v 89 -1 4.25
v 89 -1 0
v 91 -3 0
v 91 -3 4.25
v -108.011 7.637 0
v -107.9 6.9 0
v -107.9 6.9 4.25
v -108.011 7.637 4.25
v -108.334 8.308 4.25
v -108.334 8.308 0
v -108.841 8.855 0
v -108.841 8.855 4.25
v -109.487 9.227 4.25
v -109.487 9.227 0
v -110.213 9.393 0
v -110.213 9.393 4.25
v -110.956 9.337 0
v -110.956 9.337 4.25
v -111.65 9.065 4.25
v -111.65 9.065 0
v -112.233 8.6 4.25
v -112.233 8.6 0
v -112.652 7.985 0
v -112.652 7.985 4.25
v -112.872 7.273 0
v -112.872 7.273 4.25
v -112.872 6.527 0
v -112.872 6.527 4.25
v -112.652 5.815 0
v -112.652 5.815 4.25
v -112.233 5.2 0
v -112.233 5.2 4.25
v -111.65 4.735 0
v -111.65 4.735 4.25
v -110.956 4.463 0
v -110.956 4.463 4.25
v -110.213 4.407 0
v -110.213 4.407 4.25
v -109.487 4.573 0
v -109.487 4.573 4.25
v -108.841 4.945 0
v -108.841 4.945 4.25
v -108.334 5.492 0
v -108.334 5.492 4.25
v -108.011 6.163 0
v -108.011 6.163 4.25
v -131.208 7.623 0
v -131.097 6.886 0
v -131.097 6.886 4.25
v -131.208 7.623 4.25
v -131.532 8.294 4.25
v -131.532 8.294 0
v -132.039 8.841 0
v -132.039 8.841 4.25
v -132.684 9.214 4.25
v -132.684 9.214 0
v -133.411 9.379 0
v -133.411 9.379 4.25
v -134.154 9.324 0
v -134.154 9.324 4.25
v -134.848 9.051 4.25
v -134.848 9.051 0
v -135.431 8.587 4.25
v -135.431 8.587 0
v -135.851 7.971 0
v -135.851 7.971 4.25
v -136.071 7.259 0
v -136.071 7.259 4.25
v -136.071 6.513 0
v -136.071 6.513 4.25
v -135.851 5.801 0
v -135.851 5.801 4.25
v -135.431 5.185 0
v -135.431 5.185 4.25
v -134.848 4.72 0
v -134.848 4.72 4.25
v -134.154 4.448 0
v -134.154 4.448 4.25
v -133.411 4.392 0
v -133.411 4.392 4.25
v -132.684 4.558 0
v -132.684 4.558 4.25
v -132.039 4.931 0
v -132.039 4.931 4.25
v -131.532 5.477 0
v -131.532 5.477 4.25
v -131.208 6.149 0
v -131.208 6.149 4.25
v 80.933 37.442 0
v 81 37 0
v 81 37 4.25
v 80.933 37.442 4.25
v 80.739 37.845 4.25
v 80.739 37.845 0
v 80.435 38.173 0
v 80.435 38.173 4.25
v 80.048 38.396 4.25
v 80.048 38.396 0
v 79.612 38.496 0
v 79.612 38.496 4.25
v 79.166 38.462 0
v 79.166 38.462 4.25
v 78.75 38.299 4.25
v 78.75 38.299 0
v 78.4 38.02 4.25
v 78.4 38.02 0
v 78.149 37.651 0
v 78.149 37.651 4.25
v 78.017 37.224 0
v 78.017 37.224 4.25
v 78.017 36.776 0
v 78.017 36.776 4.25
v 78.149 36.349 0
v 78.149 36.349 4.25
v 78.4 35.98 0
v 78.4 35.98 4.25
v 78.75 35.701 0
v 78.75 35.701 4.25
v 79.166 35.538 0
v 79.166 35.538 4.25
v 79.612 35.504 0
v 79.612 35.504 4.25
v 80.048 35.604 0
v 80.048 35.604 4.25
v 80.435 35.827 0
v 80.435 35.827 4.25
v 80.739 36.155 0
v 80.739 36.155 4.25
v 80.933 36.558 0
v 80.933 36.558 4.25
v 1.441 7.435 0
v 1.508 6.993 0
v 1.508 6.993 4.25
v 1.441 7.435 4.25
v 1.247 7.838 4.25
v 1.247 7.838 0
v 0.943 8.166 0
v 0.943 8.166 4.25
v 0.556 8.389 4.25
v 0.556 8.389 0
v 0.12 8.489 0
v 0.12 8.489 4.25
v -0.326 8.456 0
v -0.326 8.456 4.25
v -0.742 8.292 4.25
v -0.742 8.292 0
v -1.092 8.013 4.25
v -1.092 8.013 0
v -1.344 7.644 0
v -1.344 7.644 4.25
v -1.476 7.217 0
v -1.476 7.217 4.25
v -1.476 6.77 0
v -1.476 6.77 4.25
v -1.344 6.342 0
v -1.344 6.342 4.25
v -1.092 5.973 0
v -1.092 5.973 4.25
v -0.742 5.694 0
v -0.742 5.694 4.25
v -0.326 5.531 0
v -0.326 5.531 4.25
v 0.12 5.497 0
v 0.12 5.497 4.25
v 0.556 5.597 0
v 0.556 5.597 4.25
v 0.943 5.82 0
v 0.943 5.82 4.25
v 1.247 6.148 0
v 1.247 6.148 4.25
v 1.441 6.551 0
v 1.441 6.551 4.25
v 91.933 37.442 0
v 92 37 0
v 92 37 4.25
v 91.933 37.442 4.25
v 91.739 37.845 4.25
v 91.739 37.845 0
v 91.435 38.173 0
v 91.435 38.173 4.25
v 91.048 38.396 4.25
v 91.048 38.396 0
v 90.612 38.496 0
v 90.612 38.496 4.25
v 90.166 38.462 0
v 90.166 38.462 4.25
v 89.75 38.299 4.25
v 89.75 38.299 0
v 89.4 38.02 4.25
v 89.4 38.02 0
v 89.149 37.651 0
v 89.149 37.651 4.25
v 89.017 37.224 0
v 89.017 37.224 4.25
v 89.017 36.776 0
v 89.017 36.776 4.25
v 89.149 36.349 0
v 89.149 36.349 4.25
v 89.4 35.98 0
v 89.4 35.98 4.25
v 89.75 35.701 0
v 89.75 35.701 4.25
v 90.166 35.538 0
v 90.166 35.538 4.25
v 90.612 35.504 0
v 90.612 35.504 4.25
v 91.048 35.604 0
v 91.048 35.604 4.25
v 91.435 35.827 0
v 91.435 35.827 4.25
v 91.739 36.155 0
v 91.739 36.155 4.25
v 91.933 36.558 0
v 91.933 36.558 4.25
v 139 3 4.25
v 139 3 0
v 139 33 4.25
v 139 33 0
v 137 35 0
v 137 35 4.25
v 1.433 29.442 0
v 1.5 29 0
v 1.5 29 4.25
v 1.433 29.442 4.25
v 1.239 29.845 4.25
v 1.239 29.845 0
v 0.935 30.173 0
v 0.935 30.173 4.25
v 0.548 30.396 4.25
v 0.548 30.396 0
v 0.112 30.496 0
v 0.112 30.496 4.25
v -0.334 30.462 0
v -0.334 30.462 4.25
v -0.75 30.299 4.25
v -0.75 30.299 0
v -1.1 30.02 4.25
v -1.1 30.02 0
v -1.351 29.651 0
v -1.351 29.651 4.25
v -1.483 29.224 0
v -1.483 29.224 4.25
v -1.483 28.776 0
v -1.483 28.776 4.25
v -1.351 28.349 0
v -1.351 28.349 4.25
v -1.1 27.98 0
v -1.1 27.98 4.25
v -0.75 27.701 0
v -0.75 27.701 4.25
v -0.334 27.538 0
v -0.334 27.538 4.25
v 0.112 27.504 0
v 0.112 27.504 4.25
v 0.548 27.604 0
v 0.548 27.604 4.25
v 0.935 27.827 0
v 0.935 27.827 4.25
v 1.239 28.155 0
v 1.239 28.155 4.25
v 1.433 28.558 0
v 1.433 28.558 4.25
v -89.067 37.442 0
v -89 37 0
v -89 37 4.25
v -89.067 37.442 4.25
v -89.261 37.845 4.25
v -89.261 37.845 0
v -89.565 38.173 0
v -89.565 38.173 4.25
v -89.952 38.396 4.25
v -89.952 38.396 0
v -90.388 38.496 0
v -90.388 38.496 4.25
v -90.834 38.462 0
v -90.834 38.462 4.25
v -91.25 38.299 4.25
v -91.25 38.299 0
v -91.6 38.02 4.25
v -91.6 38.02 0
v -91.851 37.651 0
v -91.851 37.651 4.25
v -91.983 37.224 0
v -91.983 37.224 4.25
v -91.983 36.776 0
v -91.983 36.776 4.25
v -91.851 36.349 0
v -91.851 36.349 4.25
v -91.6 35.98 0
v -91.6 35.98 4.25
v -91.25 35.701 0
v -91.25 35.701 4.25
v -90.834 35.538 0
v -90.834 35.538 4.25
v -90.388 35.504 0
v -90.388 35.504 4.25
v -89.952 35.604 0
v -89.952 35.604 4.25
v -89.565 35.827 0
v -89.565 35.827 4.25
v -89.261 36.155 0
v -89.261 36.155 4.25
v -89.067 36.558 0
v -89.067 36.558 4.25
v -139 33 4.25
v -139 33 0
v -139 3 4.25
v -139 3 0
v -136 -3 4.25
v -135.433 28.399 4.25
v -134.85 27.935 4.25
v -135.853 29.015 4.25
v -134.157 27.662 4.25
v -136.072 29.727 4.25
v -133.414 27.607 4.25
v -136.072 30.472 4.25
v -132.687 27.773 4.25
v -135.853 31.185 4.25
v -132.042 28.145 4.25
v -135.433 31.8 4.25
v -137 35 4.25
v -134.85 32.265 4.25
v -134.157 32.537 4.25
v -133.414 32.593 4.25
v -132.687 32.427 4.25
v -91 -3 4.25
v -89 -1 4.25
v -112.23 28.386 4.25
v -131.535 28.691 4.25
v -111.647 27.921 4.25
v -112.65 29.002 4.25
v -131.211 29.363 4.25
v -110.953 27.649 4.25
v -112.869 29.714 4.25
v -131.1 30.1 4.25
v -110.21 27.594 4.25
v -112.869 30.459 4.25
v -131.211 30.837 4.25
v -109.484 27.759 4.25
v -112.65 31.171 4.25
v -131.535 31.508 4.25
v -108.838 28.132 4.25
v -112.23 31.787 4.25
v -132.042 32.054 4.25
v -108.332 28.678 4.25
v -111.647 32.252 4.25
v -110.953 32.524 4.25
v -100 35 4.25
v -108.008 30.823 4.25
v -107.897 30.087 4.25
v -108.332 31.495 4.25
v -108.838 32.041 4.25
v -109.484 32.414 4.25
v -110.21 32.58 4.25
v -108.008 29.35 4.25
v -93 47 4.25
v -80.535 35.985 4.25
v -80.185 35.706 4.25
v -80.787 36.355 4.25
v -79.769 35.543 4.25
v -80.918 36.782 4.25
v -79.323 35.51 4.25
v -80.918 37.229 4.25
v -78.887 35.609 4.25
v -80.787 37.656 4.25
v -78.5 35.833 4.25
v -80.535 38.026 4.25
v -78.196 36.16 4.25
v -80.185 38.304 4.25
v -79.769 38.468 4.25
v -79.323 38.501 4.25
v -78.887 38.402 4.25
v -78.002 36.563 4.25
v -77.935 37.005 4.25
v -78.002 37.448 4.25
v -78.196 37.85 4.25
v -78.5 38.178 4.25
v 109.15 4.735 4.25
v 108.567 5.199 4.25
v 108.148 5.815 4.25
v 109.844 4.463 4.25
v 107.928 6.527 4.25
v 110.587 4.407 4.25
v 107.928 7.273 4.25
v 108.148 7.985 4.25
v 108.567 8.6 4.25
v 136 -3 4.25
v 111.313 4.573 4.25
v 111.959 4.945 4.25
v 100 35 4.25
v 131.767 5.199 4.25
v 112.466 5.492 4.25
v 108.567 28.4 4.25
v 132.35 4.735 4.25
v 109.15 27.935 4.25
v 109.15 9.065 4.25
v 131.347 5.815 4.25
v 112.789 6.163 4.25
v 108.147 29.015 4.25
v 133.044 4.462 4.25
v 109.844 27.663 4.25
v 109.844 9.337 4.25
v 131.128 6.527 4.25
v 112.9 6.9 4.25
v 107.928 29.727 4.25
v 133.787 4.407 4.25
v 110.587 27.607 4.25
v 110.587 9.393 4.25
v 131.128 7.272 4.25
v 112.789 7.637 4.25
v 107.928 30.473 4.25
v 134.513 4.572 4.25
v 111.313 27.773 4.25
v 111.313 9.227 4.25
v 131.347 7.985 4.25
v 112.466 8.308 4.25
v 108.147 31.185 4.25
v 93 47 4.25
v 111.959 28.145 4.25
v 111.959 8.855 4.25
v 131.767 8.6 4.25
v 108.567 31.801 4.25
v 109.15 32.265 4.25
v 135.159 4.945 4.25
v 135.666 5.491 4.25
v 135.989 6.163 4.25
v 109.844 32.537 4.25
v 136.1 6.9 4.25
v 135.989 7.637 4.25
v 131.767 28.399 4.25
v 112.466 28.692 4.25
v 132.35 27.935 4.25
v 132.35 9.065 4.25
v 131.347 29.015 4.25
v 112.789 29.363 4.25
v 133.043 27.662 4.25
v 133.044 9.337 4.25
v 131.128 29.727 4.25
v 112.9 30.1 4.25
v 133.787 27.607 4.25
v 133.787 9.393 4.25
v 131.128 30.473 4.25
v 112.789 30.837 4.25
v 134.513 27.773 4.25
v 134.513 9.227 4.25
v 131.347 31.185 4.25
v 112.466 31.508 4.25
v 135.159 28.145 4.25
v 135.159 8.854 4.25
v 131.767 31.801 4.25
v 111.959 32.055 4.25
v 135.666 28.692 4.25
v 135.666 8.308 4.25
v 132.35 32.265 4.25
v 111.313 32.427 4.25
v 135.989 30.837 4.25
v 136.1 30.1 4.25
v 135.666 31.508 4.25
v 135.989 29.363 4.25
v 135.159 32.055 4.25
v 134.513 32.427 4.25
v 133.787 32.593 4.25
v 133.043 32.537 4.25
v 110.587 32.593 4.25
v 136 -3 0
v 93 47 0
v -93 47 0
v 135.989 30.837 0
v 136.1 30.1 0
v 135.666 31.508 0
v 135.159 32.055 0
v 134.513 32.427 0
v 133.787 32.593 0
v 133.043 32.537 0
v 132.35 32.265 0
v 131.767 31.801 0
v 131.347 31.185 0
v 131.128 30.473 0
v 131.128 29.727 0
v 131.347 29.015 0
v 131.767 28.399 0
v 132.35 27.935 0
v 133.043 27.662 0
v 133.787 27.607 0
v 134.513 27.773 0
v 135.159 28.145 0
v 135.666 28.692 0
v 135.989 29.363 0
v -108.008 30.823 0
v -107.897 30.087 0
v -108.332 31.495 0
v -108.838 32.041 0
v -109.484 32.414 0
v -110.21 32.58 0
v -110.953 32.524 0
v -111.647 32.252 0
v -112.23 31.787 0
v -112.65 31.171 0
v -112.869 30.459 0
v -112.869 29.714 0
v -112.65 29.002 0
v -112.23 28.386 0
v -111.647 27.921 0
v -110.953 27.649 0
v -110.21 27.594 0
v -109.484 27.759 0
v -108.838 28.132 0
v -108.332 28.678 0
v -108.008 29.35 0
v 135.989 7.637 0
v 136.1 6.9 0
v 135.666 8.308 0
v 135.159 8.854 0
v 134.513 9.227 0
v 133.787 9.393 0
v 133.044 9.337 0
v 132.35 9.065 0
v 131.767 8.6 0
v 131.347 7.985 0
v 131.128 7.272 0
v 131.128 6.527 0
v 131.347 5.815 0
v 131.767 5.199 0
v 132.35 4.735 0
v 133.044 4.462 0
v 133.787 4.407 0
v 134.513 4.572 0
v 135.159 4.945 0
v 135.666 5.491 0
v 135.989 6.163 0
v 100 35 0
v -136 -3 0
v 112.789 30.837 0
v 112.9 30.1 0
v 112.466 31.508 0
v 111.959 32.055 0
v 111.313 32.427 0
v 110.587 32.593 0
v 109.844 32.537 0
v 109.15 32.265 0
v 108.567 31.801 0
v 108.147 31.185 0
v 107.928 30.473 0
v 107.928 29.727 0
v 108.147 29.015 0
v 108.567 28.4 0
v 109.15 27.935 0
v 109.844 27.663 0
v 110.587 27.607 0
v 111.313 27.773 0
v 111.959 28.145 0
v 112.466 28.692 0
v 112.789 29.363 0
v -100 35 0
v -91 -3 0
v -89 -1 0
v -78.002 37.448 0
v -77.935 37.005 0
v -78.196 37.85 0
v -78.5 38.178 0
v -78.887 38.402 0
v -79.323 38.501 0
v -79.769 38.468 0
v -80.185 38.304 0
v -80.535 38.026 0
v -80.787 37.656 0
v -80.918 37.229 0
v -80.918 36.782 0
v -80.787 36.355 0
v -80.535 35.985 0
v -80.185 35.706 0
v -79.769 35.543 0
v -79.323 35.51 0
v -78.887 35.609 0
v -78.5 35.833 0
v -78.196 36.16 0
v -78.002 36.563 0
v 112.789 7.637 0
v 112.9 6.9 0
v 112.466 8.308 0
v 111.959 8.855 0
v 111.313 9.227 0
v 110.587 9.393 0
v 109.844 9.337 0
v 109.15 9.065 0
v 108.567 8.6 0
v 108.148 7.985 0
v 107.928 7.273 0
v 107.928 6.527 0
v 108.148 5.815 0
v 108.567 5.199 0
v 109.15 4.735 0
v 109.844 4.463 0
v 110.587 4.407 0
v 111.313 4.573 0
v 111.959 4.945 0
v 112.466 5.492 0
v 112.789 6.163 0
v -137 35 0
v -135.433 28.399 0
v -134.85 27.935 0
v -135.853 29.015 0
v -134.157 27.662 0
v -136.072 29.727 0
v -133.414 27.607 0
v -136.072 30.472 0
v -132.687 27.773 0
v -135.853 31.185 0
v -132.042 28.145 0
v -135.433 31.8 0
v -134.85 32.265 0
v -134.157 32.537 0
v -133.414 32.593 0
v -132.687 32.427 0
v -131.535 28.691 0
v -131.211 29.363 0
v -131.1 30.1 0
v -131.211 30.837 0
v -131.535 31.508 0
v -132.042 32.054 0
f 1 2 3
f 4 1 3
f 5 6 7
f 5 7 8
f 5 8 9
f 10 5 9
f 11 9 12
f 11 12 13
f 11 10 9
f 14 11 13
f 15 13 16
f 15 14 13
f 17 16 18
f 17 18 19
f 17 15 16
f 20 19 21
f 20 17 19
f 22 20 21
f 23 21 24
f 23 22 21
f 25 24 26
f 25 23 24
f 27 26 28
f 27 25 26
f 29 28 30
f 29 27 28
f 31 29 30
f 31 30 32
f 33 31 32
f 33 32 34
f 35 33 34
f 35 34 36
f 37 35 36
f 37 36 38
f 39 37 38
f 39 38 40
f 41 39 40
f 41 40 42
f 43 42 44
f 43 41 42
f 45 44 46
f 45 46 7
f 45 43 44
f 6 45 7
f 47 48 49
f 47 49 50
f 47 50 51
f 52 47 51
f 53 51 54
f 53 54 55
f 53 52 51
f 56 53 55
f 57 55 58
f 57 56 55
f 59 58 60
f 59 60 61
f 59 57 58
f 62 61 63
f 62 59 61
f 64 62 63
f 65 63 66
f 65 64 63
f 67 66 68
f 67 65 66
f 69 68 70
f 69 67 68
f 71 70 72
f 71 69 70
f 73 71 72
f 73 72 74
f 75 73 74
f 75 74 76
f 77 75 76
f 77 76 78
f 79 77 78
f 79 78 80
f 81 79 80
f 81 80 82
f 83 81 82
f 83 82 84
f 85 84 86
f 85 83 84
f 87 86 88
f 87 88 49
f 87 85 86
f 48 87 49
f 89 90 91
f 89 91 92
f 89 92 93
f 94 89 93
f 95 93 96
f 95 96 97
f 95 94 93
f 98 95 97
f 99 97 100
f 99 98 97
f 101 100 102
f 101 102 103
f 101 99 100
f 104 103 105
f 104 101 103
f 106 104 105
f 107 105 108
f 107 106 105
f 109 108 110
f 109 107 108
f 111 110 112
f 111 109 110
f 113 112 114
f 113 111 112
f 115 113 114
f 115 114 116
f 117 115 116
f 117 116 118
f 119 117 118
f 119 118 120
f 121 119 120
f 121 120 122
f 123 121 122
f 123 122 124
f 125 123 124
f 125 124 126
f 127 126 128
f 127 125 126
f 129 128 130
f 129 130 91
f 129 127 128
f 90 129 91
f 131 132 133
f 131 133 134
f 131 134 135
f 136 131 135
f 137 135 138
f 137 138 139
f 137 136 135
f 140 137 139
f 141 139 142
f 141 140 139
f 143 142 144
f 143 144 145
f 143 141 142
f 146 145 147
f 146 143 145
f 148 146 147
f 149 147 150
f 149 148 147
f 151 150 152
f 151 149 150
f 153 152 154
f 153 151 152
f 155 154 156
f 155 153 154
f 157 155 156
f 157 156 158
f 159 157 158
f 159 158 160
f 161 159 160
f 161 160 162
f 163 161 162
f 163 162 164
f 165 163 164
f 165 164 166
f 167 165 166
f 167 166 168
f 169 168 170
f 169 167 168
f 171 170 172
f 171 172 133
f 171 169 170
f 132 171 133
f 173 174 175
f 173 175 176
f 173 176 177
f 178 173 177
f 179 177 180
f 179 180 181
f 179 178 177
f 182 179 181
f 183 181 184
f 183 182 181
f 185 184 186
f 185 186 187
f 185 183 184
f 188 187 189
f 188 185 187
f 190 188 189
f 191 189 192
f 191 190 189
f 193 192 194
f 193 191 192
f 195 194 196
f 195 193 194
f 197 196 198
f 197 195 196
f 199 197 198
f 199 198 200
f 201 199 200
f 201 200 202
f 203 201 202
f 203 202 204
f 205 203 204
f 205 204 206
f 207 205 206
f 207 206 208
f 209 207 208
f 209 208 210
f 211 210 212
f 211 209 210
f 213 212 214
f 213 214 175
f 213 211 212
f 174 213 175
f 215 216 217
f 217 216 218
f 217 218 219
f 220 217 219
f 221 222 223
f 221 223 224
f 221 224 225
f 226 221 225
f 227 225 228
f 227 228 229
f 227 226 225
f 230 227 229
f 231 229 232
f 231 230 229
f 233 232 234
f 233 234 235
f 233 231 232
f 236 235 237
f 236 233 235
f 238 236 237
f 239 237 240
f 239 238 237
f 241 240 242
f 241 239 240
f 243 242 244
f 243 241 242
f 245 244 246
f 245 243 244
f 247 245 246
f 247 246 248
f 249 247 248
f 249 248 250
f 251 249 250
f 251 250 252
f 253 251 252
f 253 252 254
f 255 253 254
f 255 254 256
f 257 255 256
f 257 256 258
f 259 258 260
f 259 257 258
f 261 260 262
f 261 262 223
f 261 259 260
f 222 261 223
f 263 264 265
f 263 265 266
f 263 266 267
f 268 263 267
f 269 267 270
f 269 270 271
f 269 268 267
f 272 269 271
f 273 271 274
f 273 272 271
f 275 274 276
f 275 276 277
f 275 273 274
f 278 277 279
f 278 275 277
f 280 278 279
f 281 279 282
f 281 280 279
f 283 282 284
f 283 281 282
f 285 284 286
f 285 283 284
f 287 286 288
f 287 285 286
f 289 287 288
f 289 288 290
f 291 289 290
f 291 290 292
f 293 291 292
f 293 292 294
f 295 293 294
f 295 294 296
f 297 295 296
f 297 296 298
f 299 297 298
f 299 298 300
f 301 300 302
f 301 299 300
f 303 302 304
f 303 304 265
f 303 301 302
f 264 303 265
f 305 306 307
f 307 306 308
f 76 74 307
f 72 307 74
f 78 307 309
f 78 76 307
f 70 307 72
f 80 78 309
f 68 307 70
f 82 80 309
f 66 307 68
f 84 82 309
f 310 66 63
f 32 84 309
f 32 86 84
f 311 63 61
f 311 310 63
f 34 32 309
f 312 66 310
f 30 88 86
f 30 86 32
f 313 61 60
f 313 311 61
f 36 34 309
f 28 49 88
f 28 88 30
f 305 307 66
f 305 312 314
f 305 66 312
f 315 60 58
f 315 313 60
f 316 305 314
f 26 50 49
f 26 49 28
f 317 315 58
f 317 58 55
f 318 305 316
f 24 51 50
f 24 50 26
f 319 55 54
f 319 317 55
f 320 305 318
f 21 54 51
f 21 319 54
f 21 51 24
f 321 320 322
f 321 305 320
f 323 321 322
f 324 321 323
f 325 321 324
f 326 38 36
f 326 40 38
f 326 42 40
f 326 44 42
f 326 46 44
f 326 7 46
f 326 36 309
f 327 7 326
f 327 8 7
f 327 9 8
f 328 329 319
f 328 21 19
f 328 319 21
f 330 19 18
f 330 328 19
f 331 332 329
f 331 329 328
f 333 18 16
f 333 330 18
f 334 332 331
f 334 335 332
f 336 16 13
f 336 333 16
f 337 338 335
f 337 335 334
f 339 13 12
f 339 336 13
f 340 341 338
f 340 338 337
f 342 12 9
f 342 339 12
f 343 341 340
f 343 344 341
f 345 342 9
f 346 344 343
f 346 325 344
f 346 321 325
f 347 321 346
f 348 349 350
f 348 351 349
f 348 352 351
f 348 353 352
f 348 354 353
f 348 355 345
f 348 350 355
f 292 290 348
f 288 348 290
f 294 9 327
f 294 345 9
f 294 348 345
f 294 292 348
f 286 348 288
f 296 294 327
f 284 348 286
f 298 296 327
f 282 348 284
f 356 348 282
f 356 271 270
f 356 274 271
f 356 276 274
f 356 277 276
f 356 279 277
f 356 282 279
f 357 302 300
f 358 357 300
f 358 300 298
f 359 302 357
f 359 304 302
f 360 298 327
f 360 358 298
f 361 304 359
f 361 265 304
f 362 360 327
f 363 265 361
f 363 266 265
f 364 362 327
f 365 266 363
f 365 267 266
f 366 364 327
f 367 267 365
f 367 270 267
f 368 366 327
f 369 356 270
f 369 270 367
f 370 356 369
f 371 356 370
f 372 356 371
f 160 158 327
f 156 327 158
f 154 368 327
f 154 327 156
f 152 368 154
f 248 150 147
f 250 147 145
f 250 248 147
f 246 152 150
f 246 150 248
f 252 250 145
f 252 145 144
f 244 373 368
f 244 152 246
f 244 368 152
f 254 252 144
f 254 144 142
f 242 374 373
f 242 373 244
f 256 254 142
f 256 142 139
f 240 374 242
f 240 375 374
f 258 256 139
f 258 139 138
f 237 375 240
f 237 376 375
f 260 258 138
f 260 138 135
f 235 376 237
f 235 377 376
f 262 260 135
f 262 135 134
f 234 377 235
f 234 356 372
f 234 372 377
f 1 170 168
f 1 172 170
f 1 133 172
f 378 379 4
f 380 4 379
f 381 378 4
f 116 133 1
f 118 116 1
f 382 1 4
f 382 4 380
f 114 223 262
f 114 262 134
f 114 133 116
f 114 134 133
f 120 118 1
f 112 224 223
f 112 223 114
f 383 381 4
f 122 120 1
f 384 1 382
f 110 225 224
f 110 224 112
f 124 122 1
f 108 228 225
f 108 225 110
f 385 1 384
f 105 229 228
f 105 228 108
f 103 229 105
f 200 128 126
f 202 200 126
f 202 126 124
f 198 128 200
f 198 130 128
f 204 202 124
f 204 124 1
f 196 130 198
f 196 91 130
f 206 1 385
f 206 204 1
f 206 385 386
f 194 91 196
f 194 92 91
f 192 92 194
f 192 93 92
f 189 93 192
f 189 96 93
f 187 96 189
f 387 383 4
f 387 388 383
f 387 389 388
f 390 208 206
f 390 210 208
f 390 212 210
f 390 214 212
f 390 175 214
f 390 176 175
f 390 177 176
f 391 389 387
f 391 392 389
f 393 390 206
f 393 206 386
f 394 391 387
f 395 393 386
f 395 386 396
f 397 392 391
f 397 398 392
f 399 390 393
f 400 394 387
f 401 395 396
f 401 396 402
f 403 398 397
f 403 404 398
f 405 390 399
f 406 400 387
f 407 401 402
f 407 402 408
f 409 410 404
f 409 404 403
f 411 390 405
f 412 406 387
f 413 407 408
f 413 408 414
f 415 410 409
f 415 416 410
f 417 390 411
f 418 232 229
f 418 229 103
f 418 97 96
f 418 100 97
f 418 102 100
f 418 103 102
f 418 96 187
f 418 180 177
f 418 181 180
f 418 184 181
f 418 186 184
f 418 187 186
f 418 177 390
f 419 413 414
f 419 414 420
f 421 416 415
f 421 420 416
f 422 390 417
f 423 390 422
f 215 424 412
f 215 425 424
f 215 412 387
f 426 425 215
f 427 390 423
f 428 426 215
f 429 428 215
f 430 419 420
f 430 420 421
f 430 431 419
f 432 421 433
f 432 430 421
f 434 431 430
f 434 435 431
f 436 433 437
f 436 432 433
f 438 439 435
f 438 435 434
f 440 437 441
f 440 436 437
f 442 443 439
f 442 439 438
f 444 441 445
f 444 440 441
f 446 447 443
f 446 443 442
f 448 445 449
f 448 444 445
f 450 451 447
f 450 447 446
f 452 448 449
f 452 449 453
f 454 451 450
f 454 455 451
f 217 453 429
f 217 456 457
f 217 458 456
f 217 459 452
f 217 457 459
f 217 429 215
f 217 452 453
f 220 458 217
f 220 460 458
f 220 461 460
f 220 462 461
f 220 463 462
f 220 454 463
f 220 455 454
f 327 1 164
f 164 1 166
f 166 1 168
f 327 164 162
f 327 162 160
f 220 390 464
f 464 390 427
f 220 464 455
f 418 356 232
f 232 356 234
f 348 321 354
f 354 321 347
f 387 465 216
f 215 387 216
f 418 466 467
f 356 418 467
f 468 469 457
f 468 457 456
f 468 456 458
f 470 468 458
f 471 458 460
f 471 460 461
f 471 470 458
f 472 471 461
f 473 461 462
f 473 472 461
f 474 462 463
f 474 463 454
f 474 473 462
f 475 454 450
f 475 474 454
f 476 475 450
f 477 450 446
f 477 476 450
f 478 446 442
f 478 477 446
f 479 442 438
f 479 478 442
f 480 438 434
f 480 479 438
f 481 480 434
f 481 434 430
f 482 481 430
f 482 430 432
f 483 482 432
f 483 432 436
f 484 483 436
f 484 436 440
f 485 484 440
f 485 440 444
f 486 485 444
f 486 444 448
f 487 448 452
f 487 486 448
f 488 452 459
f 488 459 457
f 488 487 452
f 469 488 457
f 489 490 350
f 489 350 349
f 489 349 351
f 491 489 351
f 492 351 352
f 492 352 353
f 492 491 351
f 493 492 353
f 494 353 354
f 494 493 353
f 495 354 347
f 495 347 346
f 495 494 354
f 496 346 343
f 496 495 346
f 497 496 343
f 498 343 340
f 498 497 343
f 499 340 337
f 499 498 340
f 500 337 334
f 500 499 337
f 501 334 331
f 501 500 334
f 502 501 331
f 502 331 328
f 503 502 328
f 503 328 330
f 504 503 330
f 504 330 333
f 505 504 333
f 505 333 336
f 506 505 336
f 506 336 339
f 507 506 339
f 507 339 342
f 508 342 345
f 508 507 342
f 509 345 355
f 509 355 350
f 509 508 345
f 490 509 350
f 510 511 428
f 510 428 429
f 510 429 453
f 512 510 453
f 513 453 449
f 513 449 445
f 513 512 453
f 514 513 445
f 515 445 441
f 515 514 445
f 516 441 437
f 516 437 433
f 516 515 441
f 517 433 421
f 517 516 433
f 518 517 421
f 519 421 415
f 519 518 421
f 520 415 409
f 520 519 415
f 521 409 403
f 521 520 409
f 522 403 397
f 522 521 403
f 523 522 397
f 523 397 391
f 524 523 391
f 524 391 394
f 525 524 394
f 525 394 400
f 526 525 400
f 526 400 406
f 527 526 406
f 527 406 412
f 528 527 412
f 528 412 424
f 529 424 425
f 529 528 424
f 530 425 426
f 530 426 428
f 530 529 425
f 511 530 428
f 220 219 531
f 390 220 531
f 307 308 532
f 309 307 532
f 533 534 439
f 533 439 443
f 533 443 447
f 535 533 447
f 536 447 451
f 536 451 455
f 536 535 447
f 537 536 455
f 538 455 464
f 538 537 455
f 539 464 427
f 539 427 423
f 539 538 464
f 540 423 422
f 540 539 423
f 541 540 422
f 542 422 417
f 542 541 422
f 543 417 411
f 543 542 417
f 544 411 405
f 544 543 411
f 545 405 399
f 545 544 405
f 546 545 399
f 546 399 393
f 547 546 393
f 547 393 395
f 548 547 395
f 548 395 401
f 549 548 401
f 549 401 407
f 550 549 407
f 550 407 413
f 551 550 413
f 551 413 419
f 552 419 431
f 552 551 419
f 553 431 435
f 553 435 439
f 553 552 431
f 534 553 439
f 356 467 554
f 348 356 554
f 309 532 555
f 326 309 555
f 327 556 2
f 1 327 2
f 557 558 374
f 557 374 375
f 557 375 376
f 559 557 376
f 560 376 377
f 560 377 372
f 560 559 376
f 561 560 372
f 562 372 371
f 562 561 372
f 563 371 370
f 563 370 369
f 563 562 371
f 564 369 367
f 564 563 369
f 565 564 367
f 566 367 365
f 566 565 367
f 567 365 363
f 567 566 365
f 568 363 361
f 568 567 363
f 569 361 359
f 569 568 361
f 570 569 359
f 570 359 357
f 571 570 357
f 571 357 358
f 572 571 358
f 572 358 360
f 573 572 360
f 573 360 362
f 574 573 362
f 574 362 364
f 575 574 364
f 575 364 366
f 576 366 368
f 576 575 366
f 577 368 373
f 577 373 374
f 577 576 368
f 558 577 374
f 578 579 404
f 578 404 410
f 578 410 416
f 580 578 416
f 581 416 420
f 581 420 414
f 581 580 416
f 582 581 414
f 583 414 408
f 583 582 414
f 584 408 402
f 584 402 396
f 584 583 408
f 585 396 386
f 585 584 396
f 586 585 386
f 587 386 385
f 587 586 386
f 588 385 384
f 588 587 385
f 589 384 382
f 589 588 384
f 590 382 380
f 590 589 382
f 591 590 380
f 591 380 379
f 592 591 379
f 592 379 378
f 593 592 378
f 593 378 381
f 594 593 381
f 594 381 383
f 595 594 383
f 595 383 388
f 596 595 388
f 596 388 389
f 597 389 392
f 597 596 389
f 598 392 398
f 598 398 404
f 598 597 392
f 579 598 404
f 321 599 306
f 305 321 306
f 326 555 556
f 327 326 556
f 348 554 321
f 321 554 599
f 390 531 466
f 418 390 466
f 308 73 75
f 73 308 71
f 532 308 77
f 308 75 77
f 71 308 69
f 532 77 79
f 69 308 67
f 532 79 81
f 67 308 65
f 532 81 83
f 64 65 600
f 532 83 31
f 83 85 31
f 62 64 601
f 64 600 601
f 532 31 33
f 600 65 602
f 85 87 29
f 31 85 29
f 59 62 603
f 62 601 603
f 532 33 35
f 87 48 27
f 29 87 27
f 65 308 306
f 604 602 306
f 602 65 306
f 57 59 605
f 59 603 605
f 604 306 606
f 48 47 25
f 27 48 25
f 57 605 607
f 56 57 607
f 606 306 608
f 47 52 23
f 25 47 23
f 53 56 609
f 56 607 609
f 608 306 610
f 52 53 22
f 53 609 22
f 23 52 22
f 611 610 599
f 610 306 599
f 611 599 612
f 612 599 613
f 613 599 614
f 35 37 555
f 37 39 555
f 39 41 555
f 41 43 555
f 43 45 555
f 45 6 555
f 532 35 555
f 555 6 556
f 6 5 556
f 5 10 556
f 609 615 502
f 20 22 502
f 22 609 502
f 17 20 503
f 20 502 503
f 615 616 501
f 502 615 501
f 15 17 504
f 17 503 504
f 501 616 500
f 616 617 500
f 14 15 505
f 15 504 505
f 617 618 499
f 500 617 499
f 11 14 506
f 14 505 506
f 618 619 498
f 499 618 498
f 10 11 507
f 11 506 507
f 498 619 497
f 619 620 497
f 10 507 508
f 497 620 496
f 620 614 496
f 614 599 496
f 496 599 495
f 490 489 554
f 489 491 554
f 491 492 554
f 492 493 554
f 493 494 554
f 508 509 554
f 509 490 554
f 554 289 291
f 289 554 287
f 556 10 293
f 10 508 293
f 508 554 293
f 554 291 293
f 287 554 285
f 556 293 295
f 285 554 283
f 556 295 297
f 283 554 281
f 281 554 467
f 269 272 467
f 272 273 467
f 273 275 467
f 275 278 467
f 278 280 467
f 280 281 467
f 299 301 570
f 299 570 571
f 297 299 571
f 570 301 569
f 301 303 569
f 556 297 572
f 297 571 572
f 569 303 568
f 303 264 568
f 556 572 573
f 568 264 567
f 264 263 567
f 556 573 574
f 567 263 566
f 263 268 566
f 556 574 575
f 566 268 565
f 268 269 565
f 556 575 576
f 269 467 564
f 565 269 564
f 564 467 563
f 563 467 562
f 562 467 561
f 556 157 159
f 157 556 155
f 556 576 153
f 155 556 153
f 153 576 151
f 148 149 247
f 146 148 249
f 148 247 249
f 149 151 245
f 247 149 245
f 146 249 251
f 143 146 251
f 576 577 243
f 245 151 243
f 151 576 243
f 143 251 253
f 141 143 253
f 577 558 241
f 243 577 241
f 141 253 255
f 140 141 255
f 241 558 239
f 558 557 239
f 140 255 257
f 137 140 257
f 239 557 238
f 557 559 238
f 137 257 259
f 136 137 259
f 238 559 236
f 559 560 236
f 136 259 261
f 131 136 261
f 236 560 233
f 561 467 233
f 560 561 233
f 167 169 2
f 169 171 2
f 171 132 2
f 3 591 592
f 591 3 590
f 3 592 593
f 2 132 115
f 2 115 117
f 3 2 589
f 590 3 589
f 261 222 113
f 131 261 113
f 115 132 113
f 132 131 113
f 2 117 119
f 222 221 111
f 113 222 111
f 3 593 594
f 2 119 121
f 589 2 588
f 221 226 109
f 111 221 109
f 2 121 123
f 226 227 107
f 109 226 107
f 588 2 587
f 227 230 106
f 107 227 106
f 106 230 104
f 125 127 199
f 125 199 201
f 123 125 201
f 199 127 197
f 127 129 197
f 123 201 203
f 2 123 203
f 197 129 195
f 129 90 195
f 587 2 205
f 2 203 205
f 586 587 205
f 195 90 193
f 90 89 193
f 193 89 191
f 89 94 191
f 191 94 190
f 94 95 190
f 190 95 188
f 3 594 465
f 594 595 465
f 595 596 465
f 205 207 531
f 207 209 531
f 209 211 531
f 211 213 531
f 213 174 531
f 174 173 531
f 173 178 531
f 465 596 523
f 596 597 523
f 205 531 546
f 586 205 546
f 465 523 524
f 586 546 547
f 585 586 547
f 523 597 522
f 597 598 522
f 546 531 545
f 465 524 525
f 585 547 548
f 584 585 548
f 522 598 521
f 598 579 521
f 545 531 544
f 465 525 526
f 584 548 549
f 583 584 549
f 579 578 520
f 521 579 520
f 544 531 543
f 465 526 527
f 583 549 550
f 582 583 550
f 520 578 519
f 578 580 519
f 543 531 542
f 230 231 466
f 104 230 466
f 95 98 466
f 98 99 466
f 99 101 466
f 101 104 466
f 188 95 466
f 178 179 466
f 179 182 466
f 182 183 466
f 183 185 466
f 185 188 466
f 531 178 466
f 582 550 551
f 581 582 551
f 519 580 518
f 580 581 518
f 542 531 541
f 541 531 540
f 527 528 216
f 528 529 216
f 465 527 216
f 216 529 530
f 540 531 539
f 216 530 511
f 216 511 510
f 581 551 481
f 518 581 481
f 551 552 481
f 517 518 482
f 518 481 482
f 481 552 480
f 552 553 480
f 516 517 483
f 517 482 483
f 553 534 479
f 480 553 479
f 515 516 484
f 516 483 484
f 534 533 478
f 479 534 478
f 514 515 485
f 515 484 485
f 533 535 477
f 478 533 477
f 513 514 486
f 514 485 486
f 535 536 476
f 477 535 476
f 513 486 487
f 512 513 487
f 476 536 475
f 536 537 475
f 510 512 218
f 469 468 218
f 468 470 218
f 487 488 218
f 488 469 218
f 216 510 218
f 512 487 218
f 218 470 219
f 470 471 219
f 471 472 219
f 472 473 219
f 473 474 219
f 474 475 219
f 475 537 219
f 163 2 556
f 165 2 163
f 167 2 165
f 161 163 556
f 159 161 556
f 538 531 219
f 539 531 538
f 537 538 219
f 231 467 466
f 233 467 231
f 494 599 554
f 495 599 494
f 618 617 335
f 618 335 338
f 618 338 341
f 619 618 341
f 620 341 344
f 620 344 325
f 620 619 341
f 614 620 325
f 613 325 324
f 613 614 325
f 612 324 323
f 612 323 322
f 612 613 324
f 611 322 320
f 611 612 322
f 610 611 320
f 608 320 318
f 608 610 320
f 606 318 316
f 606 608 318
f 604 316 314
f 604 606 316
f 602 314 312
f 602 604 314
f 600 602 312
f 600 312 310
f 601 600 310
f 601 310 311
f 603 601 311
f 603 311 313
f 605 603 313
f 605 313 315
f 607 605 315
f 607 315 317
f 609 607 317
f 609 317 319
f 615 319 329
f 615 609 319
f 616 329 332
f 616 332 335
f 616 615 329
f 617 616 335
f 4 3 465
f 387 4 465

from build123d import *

# Parameters (mm, degrees)
SKETCH1_R           = 2.500025339
SKETCH1_R_2         = 2.500030275
SKETCH1_R_3         = 2.50059385
SKETCH1_R_4         = 2.49996671
SKETCH1_R_5         = 1.500006603
SKETCH1_R_6         = 1.500017827
SKETCH1_R_7         = 1.499993425
SKETCH1_R_8         = 1.500001567
SKETCH1_R_9         = 1.499994017
SKETCH1_R_10        = 2.500046291
SKETCH1_R_11        = 2.500203468
SKETCH1_R_12        = 2.500034464
SKETCH1_R_13        = 2.500151338
BOSS_EXTRUDE1_DEPTH = 4.25


with BuildPart() as part:
    # Sketch1 → Boss-Extrude1 (new body)
    with BuildSketch(Plane.XY):
        Polygon((-89, -1), (89, -1), (91, -3), (136, -3), (139, 3), (139, 33), (137, 35), (100, 35), (93, 47), (-93, 47), (-100, 35), (-137, 35), (-139, 33), (-139, 3), (-136, -3), (-91, -3), align=None)
        with Locations((-133.600349177, 30.099805675)):
            Circle(SKETCH1_R, mode=Mode.SUBTRACT)
        with Locations((-110.397163401, 30.086562155)):
            Circle(SKETCH1_R_2, mode=Mode.SUBTRACT)
        with Locations((-133.597969419, 6.885824912)):
            Circle(SKETCH1_R_3, mode=Mode.SUBTRACT)
        with Locations((-110.4, 6.899985)):
            Circle(SKETCH1_R_4, mode=Mode.SUBTRACT)
        with Locations((-90.5, 37)):
            Circle(SKETCH1_R_5, mode=Mode.SUBTRACT)
        with Locations((-79.435047391, 37.005403238)):
            Circle(SKETCH1_R_6, mode=Mode.SUBTRACT)
        with Locations((1.6217e-05, 29.00002115)):
            Circle(SKETCH1_R_7, mode=Mode.SUBTRACT)
        with Locations((0.007512826, 6.993184051)):
            Circle(SKETCH1_R_8, mode=Mode.SUBTRACT)
        with Locations((79.5, 37)):
            Circle(SKETCH1_R_5, mode=Mode.SUBTRACT)
        with Locations((90.500005983, 37.00001129)):
            Circle(SKETCH1_R_9, mode=Mode.SUBTRACT)
        with Locations((110.399953709, 30.100043687)):
            Circle(SKETCH1_R_10, mode=Mode.SUBTRACT)
        with Locations((133.599796532, 30.099959619)):
            Circle(SKETCH1_R_11, mode=Mode.SUBTRACT)
        with Locations((110.399965537, 6.899913257)):
            Circle(SKETCH1_R_12, mode=Mode.SUBTRACT)
        with Locations((133.599879489, 6.899786711)):
            Circle(SKETCH1_R_13, mode=Mode.SUBTRACT)
    extrude(amount=BOSS_EXTRUDE1_DEPTH)


solid = part.part
